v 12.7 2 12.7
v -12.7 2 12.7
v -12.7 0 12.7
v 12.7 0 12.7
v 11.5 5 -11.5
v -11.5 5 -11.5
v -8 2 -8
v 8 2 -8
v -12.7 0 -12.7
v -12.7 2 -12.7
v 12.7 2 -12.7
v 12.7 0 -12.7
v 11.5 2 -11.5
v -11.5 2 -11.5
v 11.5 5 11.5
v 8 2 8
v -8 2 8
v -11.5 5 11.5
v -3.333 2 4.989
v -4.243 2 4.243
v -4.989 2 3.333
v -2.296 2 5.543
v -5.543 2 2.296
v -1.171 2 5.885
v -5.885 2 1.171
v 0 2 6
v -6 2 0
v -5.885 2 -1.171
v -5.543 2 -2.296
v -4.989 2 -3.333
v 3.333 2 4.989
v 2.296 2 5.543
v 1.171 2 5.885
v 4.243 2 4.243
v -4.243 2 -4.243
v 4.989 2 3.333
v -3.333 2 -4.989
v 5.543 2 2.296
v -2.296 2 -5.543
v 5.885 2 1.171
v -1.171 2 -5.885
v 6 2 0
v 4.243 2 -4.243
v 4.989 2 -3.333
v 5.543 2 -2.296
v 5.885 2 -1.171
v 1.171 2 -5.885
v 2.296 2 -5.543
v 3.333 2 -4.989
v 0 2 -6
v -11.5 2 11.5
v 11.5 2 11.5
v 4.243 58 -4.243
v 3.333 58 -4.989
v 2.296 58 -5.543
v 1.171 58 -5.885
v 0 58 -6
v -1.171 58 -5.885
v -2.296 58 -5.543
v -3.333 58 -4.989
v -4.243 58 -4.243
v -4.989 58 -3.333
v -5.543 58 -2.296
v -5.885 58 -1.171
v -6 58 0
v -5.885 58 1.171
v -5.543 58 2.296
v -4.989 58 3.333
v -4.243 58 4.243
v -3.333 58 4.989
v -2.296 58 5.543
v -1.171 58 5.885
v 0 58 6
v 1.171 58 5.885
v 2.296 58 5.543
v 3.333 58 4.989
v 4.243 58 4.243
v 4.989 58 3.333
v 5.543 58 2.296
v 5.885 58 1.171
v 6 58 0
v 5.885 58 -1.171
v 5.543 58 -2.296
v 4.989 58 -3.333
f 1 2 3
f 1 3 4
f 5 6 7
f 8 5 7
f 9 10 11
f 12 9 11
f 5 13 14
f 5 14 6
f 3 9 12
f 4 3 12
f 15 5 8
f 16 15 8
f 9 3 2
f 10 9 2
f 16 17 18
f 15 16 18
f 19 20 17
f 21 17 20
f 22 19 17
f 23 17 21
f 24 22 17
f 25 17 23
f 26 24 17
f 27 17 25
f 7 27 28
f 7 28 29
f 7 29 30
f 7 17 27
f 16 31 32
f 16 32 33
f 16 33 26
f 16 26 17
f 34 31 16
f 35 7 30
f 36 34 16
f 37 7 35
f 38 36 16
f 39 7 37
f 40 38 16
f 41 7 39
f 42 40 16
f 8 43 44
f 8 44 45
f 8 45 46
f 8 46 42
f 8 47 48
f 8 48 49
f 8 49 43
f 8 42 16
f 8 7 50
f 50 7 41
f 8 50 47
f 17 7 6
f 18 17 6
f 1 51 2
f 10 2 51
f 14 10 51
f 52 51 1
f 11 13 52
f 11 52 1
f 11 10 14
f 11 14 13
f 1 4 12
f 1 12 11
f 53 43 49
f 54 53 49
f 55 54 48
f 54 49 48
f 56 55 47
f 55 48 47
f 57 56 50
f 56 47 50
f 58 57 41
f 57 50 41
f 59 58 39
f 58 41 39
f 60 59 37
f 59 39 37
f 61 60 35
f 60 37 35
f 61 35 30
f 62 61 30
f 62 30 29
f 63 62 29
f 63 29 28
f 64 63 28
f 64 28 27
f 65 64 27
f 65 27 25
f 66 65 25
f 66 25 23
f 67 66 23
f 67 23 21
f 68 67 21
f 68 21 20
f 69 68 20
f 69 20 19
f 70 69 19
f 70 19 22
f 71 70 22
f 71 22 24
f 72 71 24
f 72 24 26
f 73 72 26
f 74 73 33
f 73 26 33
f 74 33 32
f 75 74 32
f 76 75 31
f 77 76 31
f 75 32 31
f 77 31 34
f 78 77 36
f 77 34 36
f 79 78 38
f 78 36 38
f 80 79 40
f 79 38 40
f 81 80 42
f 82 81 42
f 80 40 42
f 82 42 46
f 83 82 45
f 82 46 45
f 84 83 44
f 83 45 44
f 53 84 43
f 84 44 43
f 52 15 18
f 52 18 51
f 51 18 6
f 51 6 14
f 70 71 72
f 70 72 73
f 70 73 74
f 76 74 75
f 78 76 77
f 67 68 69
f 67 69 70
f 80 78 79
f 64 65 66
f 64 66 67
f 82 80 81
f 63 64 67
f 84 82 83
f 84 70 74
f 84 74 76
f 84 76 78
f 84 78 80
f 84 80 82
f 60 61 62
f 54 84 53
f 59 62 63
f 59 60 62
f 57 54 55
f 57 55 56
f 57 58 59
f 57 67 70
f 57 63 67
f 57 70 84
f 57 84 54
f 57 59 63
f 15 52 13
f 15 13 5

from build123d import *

# Parameters (mm, degrees)
SWEEP1_START        = -11.5
SWEEP1_DEPTH        = 23
SWEEP1_START_2      = -12.7
SWEEP1_2_OUTLINE_W  = 25.4
SWEEP1_2_OUTLINE_H  = 2
SWEEP1_2_DEPTH      = 25.4
SWEEP1_3_DEPTH      = 23
SKETCH3_R           = 6
BOSS_EXTRUDE1_DEPTH = 58


with BuildPart() as part:
    # Sweep1: read off the stored shape, not the designer's step
    # Sweep1 outline → Sweep1 (new body)
    with BuildSketch(Plane.XY.offset(SWEEP1_START)):
        Polygon((12.7, 0), (12.7, 2), (11.5, 2), (11.5, 5), (8, 2), (-8, 2), (-11.5, 5), (-11.5, 2), (-12.7, 2), (-12.7, 0), align=None)
    extrude(amount=SWEEP1_DEPTH)



with BuildPart() as body_2:
    # Sweep1 2 outline → Sweep1 2 (new body)
    with BuildSketch(Plane.XY.offset(SWEEP1_START_2)):
        with Locations((0, 1)):
            Rectangle(SWEEP1_2_OUTLINE_W, SWEEP1_2_OUTLINE_H)
    extrude(amount=SWEEP1_2_DEPTH)


with BuildPart() as part_1:
    add(part.part)

    add(body_2.part)  # Sweep1 3 merges body 2
    # Sweep1 3 outline → Sweep1 3 (add)
    with BuildSketch(Plane.YZ.offset(SWEEP1_START)):
        Polygon((5, -11.5), (2, -8), (2, -11.5), align=None)
        Polygon((5, 11.5), (2, 11.5), (2, 8), align=None)
    extrude(amount=SWEEP1_3_DEPTH)

    # Sketch3 → Boss-Extrude1 (add)
    with BuildSketch(Plane(origin=(0, 0, 0), x_dir=(1, 0, 0), z_dir=(0, 1, 0))):
        with Locations(Location((0, 0, 0), (0, 0, 45))):
            Circle(SKETCH3_R)
    extrude(amount=BOSS_EXTRUDE1_DEPTH)


solid = part_1.part
